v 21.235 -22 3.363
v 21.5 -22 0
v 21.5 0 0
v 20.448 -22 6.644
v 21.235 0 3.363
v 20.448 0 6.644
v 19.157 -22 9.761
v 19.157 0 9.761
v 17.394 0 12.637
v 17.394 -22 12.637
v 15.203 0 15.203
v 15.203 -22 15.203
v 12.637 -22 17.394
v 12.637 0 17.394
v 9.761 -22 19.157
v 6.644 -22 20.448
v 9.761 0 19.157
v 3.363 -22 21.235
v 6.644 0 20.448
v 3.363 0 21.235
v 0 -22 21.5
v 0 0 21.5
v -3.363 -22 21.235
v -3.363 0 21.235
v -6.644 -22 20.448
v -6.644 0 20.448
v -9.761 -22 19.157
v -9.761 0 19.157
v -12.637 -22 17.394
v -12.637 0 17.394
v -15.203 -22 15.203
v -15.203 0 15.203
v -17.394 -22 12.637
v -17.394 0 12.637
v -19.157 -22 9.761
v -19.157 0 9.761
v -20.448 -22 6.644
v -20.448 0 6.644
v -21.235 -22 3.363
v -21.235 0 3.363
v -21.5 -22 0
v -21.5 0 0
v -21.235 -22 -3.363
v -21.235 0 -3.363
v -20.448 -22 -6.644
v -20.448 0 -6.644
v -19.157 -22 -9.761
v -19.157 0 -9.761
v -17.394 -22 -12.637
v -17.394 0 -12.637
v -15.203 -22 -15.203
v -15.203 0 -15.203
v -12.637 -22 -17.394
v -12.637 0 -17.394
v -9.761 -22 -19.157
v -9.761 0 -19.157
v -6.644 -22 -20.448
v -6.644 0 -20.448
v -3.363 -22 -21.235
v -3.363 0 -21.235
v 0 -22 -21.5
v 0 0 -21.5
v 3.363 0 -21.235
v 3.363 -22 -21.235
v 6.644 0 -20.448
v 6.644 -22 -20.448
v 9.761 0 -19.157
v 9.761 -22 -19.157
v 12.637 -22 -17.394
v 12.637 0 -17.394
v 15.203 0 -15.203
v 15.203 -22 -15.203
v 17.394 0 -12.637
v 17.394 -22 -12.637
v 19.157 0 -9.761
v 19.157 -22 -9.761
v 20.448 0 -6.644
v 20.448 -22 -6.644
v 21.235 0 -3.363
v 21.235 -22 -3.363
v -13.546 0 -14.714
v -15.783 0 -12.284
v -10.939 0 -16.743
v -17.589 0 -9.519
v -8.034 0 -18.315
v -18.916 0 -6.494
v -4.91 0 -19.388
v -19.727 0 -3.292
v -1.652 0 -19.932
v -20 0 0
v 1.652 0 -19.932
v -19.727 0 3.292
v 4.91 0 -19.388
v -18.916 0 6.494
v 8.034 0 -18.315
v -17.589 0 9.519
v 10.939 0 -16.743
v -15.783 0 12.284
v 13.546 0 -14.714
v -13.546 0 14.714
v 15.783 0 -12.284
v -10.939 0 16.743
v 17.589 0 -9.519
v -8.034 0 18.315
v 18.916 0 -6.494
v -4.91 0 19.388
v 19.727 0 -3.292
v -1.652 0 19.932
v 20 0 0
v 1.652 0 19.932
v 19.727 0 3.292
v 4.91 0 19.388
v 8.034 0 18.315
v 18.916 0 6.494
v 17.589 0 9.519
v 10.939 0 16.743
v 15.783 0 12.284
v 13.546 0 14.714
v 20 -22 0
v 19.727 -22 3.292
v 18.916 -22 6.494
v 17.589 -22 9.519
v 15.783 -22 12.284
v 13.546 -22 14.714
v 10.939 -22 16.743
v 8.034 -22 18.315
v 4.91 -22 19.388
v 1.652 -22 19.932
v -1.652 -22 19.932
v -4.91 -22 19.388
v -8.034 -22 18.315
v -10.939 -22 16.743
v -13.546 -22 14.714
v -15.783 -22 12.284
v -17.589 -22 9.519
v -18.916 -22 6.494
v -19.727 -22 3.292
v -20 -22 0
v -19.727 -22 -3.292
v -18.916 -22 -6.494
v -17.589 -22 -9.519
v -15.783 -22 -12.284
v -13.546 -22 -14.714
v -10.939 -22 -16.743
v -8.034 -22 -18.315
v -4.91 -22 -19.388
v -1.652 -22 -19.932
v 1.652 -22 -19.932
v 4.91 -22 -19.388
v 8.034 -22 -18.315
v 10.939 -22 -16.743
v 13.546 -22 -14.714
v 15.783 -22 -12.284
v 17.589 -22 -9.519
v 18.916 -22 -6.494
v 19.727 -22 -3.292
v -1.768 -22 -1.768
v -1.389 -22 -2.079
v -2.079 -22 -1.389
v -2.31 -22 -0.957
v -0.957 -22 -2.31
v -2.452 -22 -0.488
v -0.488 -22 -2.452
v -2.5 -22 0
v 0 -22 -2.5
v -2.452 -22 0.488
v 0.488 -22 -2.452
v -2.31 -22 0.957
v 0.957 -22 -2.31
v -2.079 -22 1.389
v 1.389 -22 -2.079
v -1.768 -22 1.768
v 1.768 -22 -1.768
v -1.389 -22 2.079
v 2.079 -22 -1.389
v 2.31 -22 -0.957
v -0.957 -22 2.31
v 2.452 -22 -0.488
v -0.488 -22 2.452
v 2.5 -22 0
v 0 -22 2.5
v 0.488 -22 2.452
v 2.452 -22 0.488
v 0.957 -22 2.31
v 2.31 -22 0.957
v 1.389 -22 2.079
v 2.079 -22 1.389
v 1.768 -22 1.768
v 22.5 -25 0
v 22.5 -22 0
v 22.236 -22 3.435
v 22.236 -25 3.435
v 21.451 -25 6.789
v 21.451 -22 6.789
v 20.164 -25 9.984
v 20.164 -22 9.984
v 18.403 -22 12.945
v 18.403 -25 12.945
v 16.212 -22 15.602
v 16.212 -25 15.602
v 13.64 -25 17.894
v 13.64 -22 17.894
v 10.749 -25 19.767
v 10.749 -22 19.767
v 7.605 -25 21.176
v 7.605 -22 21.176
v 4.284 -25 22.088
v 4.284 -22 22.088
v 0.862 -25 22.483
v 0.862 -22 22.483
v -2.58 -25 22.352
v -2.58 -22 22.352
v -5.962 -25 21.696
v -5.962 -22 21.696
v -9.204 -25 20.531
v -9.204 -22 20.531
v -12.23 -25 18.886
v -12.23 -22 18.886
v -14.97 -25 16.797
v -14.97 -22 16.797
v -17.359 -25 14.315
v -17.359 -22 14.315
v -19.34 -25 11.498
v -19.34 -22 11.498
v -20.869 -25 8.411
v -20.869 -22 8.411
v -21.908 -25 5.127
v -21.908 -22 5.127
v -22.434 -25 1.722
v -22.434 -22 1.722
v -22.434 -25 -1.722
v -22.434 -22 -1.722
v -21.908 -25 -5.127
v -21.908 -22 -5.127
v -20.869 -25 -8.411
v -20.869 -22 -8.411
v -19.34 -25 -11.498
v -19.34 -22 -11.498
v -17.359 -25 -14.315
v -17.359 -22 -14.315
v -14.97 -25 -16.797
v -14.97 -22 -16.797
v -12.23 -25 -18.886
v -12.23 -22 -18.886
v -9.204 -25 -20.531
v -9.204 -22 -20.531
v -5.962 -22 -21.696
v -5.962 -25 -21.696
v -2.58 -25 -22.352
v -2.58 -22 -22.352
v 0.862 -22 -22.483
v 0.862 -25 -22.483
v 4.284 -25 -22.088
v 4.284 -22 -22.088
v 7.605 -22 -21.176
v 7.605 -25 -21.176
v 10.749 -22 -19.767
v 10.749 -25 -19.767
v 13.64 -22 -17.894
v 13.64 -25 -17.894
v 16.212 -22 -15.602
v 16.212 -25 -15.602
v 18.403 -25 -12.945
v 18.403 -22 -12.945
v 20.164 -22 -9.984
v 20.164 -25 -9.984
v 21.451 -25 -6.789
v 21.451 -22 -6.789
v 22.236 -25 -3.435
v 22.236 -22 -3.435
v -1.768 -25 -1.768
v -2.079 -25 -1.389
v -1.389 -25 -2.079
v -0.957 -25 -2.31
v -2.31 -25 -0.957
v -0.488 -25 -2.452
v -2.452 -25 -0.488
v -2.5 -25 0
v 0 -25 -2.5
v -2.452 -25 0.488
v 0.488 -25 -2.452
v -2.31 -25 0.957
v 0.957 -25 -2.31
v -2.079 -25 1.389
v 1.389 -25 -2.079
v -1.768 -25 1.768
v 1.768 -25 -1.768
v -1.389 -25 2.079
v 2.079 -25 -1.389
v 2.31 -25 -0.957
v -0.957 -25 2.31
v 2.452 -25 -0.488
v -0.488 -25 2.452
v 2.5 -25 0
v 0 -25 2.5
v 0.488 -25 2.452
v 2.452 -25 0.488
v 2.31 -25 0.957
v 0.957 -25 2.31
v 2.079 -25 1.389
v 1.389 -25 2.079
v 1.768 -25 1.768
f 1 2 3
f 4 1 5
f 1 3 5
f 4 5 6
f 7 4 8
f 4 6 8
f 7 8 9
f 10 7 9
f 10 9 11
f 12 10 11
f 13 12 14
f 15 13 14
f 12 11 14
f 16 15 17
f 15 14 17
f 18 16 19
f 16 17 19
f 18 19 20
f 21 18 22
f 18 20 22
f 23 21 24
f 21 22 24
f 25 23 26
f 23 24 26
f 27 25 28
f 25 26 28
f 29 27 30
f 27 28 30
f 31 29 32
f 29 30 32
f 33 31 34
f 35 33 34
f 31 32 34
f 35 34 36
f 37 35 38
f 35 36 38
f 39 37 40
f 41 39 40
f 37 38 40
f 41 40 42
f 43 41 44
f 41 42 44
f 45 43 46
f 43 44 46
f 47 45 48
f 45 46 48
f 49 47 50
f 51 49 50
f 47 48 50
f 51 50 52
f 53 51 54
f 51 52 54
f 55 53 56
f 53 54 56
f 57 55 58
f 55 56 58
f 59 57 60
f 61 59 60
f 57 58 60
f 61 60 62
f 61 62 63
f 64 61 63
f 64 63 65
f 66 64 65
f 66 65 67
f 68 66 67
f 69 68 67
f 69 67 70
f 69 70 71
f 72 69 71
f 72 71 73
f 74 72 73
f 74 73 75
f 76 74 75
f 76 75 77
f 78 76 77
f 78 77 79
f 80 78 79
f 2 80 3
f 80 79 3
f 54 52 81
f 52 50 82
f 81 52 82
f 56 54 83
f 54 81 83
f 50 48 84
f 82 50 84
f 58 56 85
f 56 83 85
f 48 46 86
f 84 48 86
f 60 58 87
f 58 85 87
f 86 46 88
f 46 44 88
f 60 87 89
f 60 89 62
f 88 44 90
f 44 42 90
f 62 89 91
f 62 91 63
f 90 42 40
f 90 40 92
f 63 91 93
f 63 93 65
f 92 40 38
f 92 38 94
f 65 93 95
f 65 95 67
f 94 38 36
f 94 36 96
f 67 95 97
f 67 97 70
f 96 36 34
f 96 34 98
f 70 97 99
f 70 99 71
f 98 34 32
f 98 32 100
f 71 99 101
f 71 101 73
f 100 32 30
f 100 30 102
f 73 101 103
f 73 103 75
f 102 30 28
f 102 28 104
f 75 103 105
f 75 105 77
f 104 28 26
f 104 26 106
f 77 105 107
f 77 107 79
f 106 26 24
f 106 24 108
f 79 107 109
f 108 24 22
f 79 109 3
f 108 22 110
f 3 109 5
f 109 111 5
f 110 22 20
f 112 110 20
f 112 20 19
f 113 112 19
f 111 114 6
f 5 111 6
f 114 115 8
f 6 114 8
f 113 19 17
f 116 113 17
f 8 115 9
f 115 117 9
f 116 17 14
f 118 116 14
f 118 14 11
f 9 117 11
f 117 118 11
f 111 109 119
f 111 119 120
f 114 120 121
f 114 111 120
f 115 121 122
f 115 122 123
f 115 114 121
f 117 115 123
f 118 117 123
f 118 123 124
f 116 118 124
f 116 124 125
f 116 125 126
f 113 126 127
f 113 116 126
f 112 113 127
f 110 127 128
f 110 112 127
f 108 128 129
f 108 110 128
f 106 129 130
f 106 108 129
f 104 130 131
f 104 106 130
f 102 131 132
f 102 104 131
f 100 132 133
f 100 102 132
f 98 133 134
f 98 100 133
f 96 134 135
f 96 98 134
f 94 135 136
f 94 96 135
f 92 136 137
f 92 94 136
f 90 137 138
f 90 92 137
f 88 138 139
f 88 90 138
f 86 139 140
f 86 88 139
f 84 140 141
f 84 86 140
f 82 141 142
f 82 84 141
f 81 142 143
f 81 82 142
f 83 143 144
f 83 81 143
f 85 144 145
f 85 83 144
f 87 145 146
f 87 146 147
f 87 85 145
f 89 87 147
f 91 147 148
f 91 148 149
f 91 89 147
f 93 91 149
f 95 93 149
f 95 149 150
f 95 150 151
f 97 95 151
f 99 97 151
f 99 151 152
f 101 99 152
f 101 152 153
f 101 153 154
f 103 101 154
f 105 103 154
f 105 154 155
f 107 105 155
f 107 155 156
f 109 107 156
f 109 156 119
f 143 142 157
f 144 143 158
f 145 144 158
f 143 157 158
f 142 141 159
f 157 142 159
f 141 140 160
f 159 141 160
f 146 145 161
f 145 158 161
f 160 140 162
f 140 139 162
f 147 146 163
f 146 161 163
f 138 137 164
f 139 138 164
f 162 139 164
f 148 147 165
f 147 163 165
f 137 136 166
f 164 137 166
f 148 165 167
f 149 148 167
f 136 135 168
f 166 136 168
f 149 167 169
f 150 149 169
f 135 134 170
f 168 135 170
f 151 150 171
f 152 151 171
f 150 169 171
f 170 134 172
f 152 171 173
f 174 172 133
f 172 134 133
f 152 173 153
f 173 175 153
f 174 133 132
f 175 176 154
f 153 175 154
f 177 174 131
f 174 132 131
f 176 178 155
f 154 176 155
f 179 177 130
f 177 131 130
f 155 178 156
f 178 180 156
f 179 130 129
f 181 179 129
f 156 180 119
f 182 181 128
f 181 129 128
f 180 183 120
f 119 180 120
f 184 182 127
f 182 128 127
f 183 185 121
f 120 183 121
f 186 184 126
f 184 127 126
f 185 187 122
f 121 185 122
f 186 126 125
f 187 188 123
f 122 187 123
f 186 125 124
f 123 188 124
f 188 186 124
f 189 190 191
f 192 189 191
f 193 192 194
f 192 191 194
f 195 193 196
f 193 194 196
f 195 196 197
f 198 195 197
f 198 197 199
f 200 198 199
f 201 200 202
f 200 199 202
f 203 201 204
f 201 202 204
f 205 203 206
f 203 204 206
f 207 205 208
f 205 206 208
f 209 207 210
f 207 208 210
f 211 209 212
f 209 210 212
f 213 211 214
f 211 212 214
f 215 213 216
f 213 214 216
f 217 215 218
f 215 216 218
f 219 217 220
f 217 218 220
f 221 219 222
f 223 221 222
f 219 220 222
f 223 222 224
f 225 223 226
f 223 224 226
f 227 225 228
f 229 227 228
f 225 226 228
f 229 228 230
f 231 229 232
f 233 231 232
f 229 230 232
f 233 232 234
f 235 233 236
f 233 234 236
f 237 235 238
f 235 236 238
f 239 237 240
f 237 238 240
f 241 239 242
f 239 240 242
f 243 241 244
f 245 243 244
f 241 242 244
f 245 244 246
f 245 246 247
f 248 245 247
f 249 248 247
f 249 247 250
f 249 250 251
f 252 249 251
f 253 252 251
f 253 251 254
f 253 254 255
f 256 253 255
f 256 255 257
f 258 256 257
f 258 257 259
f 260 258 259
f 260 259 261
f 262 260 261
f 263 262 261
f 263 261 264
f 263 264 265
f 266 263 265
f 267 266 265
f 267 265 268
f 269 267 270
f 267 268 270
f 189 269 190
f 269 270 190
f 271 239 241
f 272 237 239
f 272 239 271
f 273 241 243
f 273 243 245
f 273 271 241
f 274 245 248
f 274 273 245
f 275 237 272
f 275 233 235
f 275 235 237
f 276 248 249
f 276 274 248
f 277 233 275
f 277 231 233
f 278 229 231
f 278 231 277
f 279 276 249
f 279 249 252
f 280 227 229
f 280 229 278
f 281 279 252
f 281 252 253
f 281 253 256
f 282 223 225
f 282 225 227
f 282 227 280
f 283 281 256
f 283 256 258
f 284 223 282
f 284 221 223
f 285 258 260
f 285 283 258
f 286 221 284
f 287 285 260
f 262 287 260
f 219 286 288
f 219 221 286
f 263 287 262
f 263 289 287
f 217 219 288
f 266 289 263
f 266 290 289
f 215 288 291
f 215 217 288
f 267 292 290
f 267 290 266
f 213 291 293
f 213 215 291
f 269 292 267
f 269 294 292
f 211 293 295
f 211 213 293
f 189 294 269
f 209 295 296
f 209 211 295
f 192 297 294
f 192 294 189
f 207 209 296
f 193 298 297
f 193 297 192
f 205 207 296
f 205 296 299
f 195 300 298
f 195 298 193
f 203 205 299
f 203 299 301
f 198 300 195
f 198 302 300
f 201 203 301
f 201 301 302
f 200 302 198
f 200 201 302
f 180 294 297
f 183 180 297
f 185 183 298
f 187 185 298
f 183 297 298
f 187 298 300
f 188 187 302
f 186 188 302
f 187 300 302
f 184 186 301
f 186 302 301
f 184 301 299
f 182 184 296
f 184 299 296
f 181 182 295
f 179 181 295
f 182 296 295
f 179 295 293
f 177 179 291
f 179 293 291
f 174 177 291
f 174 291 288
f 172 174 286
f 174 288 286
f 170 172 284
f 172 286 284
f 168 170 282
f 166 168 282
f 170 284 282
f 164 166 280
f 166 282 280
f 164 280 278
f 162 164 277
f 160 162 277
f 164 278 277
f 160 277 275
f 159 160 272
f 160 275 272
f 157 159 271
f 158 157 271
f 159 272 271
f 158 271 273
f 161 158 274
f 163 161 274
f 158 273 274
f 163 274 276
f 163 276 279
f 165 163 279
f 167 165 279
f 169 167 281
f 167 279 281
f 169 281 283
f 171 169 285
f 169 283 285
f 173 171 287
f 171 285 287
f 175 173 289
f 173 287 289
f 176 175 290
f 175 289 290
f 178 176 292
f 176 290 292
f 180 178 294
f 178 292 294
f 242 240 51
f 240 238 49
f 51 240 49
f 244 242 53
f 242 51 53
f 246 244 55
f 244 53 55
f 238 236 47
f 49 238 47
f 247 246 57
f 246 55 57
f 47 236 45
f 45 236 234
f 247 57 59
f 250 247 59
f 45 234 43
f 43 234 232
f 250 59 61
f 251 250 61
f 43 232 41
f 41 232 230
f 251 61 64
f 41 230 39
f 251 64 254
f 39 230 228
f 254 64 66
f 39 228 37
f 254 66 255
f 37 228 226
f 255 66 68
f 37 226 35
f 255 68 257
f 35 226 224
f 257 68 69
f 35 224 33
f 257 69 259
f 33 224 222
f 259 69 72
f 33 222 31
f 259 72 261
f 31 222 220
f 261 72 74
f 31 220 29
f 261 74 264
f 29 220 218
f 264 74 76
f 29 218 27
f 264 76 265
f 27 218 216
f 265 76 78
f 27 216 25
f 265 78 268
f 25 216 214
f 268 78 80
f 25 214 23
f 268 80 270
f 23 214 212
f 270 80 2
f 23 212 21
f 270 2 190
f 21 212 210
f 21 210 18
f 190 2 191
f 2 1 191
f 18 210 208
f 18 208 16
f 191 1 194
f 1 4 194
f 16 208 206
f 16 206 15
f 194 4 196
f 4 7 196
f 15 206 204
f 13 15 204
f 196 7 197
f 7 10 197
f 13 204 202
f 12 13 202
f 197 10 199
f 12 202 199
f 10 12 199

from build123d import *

# Parameters (mm, degrees)
F0_R     = 21.5
F0_R_2   = 20
F1_DEPTH = 22
F2_R     = 22.5
F3_DEPTH = 3
F4_R     = 2.5
F5_DEPTH = 3


with BuildPart() as f1:
    # F0 (on Front) → F1 (new body)
    with BuildSketch(Plane.XZ):
        Circle(F0_R)
        Circle(F0_R_2, mode=Mode.SUBTRACT)
    extrude(amount=F1_DEPTH)

    # F2 (on face) → F3 (join)
    with BuildSketch(Plane.XZ.offset(22)):
        Circle(F2_R)
    extrude(amount=F3_DEPTH)

    # F4 (on face) → F5 (cut)
    with BuildSketch(Plane.XZ.offset(25)):
        Circle(F4_R)
    extrude(amount=-F5_DEPTH, mode=Mode.SUBTRACT)


solid = f1.part
